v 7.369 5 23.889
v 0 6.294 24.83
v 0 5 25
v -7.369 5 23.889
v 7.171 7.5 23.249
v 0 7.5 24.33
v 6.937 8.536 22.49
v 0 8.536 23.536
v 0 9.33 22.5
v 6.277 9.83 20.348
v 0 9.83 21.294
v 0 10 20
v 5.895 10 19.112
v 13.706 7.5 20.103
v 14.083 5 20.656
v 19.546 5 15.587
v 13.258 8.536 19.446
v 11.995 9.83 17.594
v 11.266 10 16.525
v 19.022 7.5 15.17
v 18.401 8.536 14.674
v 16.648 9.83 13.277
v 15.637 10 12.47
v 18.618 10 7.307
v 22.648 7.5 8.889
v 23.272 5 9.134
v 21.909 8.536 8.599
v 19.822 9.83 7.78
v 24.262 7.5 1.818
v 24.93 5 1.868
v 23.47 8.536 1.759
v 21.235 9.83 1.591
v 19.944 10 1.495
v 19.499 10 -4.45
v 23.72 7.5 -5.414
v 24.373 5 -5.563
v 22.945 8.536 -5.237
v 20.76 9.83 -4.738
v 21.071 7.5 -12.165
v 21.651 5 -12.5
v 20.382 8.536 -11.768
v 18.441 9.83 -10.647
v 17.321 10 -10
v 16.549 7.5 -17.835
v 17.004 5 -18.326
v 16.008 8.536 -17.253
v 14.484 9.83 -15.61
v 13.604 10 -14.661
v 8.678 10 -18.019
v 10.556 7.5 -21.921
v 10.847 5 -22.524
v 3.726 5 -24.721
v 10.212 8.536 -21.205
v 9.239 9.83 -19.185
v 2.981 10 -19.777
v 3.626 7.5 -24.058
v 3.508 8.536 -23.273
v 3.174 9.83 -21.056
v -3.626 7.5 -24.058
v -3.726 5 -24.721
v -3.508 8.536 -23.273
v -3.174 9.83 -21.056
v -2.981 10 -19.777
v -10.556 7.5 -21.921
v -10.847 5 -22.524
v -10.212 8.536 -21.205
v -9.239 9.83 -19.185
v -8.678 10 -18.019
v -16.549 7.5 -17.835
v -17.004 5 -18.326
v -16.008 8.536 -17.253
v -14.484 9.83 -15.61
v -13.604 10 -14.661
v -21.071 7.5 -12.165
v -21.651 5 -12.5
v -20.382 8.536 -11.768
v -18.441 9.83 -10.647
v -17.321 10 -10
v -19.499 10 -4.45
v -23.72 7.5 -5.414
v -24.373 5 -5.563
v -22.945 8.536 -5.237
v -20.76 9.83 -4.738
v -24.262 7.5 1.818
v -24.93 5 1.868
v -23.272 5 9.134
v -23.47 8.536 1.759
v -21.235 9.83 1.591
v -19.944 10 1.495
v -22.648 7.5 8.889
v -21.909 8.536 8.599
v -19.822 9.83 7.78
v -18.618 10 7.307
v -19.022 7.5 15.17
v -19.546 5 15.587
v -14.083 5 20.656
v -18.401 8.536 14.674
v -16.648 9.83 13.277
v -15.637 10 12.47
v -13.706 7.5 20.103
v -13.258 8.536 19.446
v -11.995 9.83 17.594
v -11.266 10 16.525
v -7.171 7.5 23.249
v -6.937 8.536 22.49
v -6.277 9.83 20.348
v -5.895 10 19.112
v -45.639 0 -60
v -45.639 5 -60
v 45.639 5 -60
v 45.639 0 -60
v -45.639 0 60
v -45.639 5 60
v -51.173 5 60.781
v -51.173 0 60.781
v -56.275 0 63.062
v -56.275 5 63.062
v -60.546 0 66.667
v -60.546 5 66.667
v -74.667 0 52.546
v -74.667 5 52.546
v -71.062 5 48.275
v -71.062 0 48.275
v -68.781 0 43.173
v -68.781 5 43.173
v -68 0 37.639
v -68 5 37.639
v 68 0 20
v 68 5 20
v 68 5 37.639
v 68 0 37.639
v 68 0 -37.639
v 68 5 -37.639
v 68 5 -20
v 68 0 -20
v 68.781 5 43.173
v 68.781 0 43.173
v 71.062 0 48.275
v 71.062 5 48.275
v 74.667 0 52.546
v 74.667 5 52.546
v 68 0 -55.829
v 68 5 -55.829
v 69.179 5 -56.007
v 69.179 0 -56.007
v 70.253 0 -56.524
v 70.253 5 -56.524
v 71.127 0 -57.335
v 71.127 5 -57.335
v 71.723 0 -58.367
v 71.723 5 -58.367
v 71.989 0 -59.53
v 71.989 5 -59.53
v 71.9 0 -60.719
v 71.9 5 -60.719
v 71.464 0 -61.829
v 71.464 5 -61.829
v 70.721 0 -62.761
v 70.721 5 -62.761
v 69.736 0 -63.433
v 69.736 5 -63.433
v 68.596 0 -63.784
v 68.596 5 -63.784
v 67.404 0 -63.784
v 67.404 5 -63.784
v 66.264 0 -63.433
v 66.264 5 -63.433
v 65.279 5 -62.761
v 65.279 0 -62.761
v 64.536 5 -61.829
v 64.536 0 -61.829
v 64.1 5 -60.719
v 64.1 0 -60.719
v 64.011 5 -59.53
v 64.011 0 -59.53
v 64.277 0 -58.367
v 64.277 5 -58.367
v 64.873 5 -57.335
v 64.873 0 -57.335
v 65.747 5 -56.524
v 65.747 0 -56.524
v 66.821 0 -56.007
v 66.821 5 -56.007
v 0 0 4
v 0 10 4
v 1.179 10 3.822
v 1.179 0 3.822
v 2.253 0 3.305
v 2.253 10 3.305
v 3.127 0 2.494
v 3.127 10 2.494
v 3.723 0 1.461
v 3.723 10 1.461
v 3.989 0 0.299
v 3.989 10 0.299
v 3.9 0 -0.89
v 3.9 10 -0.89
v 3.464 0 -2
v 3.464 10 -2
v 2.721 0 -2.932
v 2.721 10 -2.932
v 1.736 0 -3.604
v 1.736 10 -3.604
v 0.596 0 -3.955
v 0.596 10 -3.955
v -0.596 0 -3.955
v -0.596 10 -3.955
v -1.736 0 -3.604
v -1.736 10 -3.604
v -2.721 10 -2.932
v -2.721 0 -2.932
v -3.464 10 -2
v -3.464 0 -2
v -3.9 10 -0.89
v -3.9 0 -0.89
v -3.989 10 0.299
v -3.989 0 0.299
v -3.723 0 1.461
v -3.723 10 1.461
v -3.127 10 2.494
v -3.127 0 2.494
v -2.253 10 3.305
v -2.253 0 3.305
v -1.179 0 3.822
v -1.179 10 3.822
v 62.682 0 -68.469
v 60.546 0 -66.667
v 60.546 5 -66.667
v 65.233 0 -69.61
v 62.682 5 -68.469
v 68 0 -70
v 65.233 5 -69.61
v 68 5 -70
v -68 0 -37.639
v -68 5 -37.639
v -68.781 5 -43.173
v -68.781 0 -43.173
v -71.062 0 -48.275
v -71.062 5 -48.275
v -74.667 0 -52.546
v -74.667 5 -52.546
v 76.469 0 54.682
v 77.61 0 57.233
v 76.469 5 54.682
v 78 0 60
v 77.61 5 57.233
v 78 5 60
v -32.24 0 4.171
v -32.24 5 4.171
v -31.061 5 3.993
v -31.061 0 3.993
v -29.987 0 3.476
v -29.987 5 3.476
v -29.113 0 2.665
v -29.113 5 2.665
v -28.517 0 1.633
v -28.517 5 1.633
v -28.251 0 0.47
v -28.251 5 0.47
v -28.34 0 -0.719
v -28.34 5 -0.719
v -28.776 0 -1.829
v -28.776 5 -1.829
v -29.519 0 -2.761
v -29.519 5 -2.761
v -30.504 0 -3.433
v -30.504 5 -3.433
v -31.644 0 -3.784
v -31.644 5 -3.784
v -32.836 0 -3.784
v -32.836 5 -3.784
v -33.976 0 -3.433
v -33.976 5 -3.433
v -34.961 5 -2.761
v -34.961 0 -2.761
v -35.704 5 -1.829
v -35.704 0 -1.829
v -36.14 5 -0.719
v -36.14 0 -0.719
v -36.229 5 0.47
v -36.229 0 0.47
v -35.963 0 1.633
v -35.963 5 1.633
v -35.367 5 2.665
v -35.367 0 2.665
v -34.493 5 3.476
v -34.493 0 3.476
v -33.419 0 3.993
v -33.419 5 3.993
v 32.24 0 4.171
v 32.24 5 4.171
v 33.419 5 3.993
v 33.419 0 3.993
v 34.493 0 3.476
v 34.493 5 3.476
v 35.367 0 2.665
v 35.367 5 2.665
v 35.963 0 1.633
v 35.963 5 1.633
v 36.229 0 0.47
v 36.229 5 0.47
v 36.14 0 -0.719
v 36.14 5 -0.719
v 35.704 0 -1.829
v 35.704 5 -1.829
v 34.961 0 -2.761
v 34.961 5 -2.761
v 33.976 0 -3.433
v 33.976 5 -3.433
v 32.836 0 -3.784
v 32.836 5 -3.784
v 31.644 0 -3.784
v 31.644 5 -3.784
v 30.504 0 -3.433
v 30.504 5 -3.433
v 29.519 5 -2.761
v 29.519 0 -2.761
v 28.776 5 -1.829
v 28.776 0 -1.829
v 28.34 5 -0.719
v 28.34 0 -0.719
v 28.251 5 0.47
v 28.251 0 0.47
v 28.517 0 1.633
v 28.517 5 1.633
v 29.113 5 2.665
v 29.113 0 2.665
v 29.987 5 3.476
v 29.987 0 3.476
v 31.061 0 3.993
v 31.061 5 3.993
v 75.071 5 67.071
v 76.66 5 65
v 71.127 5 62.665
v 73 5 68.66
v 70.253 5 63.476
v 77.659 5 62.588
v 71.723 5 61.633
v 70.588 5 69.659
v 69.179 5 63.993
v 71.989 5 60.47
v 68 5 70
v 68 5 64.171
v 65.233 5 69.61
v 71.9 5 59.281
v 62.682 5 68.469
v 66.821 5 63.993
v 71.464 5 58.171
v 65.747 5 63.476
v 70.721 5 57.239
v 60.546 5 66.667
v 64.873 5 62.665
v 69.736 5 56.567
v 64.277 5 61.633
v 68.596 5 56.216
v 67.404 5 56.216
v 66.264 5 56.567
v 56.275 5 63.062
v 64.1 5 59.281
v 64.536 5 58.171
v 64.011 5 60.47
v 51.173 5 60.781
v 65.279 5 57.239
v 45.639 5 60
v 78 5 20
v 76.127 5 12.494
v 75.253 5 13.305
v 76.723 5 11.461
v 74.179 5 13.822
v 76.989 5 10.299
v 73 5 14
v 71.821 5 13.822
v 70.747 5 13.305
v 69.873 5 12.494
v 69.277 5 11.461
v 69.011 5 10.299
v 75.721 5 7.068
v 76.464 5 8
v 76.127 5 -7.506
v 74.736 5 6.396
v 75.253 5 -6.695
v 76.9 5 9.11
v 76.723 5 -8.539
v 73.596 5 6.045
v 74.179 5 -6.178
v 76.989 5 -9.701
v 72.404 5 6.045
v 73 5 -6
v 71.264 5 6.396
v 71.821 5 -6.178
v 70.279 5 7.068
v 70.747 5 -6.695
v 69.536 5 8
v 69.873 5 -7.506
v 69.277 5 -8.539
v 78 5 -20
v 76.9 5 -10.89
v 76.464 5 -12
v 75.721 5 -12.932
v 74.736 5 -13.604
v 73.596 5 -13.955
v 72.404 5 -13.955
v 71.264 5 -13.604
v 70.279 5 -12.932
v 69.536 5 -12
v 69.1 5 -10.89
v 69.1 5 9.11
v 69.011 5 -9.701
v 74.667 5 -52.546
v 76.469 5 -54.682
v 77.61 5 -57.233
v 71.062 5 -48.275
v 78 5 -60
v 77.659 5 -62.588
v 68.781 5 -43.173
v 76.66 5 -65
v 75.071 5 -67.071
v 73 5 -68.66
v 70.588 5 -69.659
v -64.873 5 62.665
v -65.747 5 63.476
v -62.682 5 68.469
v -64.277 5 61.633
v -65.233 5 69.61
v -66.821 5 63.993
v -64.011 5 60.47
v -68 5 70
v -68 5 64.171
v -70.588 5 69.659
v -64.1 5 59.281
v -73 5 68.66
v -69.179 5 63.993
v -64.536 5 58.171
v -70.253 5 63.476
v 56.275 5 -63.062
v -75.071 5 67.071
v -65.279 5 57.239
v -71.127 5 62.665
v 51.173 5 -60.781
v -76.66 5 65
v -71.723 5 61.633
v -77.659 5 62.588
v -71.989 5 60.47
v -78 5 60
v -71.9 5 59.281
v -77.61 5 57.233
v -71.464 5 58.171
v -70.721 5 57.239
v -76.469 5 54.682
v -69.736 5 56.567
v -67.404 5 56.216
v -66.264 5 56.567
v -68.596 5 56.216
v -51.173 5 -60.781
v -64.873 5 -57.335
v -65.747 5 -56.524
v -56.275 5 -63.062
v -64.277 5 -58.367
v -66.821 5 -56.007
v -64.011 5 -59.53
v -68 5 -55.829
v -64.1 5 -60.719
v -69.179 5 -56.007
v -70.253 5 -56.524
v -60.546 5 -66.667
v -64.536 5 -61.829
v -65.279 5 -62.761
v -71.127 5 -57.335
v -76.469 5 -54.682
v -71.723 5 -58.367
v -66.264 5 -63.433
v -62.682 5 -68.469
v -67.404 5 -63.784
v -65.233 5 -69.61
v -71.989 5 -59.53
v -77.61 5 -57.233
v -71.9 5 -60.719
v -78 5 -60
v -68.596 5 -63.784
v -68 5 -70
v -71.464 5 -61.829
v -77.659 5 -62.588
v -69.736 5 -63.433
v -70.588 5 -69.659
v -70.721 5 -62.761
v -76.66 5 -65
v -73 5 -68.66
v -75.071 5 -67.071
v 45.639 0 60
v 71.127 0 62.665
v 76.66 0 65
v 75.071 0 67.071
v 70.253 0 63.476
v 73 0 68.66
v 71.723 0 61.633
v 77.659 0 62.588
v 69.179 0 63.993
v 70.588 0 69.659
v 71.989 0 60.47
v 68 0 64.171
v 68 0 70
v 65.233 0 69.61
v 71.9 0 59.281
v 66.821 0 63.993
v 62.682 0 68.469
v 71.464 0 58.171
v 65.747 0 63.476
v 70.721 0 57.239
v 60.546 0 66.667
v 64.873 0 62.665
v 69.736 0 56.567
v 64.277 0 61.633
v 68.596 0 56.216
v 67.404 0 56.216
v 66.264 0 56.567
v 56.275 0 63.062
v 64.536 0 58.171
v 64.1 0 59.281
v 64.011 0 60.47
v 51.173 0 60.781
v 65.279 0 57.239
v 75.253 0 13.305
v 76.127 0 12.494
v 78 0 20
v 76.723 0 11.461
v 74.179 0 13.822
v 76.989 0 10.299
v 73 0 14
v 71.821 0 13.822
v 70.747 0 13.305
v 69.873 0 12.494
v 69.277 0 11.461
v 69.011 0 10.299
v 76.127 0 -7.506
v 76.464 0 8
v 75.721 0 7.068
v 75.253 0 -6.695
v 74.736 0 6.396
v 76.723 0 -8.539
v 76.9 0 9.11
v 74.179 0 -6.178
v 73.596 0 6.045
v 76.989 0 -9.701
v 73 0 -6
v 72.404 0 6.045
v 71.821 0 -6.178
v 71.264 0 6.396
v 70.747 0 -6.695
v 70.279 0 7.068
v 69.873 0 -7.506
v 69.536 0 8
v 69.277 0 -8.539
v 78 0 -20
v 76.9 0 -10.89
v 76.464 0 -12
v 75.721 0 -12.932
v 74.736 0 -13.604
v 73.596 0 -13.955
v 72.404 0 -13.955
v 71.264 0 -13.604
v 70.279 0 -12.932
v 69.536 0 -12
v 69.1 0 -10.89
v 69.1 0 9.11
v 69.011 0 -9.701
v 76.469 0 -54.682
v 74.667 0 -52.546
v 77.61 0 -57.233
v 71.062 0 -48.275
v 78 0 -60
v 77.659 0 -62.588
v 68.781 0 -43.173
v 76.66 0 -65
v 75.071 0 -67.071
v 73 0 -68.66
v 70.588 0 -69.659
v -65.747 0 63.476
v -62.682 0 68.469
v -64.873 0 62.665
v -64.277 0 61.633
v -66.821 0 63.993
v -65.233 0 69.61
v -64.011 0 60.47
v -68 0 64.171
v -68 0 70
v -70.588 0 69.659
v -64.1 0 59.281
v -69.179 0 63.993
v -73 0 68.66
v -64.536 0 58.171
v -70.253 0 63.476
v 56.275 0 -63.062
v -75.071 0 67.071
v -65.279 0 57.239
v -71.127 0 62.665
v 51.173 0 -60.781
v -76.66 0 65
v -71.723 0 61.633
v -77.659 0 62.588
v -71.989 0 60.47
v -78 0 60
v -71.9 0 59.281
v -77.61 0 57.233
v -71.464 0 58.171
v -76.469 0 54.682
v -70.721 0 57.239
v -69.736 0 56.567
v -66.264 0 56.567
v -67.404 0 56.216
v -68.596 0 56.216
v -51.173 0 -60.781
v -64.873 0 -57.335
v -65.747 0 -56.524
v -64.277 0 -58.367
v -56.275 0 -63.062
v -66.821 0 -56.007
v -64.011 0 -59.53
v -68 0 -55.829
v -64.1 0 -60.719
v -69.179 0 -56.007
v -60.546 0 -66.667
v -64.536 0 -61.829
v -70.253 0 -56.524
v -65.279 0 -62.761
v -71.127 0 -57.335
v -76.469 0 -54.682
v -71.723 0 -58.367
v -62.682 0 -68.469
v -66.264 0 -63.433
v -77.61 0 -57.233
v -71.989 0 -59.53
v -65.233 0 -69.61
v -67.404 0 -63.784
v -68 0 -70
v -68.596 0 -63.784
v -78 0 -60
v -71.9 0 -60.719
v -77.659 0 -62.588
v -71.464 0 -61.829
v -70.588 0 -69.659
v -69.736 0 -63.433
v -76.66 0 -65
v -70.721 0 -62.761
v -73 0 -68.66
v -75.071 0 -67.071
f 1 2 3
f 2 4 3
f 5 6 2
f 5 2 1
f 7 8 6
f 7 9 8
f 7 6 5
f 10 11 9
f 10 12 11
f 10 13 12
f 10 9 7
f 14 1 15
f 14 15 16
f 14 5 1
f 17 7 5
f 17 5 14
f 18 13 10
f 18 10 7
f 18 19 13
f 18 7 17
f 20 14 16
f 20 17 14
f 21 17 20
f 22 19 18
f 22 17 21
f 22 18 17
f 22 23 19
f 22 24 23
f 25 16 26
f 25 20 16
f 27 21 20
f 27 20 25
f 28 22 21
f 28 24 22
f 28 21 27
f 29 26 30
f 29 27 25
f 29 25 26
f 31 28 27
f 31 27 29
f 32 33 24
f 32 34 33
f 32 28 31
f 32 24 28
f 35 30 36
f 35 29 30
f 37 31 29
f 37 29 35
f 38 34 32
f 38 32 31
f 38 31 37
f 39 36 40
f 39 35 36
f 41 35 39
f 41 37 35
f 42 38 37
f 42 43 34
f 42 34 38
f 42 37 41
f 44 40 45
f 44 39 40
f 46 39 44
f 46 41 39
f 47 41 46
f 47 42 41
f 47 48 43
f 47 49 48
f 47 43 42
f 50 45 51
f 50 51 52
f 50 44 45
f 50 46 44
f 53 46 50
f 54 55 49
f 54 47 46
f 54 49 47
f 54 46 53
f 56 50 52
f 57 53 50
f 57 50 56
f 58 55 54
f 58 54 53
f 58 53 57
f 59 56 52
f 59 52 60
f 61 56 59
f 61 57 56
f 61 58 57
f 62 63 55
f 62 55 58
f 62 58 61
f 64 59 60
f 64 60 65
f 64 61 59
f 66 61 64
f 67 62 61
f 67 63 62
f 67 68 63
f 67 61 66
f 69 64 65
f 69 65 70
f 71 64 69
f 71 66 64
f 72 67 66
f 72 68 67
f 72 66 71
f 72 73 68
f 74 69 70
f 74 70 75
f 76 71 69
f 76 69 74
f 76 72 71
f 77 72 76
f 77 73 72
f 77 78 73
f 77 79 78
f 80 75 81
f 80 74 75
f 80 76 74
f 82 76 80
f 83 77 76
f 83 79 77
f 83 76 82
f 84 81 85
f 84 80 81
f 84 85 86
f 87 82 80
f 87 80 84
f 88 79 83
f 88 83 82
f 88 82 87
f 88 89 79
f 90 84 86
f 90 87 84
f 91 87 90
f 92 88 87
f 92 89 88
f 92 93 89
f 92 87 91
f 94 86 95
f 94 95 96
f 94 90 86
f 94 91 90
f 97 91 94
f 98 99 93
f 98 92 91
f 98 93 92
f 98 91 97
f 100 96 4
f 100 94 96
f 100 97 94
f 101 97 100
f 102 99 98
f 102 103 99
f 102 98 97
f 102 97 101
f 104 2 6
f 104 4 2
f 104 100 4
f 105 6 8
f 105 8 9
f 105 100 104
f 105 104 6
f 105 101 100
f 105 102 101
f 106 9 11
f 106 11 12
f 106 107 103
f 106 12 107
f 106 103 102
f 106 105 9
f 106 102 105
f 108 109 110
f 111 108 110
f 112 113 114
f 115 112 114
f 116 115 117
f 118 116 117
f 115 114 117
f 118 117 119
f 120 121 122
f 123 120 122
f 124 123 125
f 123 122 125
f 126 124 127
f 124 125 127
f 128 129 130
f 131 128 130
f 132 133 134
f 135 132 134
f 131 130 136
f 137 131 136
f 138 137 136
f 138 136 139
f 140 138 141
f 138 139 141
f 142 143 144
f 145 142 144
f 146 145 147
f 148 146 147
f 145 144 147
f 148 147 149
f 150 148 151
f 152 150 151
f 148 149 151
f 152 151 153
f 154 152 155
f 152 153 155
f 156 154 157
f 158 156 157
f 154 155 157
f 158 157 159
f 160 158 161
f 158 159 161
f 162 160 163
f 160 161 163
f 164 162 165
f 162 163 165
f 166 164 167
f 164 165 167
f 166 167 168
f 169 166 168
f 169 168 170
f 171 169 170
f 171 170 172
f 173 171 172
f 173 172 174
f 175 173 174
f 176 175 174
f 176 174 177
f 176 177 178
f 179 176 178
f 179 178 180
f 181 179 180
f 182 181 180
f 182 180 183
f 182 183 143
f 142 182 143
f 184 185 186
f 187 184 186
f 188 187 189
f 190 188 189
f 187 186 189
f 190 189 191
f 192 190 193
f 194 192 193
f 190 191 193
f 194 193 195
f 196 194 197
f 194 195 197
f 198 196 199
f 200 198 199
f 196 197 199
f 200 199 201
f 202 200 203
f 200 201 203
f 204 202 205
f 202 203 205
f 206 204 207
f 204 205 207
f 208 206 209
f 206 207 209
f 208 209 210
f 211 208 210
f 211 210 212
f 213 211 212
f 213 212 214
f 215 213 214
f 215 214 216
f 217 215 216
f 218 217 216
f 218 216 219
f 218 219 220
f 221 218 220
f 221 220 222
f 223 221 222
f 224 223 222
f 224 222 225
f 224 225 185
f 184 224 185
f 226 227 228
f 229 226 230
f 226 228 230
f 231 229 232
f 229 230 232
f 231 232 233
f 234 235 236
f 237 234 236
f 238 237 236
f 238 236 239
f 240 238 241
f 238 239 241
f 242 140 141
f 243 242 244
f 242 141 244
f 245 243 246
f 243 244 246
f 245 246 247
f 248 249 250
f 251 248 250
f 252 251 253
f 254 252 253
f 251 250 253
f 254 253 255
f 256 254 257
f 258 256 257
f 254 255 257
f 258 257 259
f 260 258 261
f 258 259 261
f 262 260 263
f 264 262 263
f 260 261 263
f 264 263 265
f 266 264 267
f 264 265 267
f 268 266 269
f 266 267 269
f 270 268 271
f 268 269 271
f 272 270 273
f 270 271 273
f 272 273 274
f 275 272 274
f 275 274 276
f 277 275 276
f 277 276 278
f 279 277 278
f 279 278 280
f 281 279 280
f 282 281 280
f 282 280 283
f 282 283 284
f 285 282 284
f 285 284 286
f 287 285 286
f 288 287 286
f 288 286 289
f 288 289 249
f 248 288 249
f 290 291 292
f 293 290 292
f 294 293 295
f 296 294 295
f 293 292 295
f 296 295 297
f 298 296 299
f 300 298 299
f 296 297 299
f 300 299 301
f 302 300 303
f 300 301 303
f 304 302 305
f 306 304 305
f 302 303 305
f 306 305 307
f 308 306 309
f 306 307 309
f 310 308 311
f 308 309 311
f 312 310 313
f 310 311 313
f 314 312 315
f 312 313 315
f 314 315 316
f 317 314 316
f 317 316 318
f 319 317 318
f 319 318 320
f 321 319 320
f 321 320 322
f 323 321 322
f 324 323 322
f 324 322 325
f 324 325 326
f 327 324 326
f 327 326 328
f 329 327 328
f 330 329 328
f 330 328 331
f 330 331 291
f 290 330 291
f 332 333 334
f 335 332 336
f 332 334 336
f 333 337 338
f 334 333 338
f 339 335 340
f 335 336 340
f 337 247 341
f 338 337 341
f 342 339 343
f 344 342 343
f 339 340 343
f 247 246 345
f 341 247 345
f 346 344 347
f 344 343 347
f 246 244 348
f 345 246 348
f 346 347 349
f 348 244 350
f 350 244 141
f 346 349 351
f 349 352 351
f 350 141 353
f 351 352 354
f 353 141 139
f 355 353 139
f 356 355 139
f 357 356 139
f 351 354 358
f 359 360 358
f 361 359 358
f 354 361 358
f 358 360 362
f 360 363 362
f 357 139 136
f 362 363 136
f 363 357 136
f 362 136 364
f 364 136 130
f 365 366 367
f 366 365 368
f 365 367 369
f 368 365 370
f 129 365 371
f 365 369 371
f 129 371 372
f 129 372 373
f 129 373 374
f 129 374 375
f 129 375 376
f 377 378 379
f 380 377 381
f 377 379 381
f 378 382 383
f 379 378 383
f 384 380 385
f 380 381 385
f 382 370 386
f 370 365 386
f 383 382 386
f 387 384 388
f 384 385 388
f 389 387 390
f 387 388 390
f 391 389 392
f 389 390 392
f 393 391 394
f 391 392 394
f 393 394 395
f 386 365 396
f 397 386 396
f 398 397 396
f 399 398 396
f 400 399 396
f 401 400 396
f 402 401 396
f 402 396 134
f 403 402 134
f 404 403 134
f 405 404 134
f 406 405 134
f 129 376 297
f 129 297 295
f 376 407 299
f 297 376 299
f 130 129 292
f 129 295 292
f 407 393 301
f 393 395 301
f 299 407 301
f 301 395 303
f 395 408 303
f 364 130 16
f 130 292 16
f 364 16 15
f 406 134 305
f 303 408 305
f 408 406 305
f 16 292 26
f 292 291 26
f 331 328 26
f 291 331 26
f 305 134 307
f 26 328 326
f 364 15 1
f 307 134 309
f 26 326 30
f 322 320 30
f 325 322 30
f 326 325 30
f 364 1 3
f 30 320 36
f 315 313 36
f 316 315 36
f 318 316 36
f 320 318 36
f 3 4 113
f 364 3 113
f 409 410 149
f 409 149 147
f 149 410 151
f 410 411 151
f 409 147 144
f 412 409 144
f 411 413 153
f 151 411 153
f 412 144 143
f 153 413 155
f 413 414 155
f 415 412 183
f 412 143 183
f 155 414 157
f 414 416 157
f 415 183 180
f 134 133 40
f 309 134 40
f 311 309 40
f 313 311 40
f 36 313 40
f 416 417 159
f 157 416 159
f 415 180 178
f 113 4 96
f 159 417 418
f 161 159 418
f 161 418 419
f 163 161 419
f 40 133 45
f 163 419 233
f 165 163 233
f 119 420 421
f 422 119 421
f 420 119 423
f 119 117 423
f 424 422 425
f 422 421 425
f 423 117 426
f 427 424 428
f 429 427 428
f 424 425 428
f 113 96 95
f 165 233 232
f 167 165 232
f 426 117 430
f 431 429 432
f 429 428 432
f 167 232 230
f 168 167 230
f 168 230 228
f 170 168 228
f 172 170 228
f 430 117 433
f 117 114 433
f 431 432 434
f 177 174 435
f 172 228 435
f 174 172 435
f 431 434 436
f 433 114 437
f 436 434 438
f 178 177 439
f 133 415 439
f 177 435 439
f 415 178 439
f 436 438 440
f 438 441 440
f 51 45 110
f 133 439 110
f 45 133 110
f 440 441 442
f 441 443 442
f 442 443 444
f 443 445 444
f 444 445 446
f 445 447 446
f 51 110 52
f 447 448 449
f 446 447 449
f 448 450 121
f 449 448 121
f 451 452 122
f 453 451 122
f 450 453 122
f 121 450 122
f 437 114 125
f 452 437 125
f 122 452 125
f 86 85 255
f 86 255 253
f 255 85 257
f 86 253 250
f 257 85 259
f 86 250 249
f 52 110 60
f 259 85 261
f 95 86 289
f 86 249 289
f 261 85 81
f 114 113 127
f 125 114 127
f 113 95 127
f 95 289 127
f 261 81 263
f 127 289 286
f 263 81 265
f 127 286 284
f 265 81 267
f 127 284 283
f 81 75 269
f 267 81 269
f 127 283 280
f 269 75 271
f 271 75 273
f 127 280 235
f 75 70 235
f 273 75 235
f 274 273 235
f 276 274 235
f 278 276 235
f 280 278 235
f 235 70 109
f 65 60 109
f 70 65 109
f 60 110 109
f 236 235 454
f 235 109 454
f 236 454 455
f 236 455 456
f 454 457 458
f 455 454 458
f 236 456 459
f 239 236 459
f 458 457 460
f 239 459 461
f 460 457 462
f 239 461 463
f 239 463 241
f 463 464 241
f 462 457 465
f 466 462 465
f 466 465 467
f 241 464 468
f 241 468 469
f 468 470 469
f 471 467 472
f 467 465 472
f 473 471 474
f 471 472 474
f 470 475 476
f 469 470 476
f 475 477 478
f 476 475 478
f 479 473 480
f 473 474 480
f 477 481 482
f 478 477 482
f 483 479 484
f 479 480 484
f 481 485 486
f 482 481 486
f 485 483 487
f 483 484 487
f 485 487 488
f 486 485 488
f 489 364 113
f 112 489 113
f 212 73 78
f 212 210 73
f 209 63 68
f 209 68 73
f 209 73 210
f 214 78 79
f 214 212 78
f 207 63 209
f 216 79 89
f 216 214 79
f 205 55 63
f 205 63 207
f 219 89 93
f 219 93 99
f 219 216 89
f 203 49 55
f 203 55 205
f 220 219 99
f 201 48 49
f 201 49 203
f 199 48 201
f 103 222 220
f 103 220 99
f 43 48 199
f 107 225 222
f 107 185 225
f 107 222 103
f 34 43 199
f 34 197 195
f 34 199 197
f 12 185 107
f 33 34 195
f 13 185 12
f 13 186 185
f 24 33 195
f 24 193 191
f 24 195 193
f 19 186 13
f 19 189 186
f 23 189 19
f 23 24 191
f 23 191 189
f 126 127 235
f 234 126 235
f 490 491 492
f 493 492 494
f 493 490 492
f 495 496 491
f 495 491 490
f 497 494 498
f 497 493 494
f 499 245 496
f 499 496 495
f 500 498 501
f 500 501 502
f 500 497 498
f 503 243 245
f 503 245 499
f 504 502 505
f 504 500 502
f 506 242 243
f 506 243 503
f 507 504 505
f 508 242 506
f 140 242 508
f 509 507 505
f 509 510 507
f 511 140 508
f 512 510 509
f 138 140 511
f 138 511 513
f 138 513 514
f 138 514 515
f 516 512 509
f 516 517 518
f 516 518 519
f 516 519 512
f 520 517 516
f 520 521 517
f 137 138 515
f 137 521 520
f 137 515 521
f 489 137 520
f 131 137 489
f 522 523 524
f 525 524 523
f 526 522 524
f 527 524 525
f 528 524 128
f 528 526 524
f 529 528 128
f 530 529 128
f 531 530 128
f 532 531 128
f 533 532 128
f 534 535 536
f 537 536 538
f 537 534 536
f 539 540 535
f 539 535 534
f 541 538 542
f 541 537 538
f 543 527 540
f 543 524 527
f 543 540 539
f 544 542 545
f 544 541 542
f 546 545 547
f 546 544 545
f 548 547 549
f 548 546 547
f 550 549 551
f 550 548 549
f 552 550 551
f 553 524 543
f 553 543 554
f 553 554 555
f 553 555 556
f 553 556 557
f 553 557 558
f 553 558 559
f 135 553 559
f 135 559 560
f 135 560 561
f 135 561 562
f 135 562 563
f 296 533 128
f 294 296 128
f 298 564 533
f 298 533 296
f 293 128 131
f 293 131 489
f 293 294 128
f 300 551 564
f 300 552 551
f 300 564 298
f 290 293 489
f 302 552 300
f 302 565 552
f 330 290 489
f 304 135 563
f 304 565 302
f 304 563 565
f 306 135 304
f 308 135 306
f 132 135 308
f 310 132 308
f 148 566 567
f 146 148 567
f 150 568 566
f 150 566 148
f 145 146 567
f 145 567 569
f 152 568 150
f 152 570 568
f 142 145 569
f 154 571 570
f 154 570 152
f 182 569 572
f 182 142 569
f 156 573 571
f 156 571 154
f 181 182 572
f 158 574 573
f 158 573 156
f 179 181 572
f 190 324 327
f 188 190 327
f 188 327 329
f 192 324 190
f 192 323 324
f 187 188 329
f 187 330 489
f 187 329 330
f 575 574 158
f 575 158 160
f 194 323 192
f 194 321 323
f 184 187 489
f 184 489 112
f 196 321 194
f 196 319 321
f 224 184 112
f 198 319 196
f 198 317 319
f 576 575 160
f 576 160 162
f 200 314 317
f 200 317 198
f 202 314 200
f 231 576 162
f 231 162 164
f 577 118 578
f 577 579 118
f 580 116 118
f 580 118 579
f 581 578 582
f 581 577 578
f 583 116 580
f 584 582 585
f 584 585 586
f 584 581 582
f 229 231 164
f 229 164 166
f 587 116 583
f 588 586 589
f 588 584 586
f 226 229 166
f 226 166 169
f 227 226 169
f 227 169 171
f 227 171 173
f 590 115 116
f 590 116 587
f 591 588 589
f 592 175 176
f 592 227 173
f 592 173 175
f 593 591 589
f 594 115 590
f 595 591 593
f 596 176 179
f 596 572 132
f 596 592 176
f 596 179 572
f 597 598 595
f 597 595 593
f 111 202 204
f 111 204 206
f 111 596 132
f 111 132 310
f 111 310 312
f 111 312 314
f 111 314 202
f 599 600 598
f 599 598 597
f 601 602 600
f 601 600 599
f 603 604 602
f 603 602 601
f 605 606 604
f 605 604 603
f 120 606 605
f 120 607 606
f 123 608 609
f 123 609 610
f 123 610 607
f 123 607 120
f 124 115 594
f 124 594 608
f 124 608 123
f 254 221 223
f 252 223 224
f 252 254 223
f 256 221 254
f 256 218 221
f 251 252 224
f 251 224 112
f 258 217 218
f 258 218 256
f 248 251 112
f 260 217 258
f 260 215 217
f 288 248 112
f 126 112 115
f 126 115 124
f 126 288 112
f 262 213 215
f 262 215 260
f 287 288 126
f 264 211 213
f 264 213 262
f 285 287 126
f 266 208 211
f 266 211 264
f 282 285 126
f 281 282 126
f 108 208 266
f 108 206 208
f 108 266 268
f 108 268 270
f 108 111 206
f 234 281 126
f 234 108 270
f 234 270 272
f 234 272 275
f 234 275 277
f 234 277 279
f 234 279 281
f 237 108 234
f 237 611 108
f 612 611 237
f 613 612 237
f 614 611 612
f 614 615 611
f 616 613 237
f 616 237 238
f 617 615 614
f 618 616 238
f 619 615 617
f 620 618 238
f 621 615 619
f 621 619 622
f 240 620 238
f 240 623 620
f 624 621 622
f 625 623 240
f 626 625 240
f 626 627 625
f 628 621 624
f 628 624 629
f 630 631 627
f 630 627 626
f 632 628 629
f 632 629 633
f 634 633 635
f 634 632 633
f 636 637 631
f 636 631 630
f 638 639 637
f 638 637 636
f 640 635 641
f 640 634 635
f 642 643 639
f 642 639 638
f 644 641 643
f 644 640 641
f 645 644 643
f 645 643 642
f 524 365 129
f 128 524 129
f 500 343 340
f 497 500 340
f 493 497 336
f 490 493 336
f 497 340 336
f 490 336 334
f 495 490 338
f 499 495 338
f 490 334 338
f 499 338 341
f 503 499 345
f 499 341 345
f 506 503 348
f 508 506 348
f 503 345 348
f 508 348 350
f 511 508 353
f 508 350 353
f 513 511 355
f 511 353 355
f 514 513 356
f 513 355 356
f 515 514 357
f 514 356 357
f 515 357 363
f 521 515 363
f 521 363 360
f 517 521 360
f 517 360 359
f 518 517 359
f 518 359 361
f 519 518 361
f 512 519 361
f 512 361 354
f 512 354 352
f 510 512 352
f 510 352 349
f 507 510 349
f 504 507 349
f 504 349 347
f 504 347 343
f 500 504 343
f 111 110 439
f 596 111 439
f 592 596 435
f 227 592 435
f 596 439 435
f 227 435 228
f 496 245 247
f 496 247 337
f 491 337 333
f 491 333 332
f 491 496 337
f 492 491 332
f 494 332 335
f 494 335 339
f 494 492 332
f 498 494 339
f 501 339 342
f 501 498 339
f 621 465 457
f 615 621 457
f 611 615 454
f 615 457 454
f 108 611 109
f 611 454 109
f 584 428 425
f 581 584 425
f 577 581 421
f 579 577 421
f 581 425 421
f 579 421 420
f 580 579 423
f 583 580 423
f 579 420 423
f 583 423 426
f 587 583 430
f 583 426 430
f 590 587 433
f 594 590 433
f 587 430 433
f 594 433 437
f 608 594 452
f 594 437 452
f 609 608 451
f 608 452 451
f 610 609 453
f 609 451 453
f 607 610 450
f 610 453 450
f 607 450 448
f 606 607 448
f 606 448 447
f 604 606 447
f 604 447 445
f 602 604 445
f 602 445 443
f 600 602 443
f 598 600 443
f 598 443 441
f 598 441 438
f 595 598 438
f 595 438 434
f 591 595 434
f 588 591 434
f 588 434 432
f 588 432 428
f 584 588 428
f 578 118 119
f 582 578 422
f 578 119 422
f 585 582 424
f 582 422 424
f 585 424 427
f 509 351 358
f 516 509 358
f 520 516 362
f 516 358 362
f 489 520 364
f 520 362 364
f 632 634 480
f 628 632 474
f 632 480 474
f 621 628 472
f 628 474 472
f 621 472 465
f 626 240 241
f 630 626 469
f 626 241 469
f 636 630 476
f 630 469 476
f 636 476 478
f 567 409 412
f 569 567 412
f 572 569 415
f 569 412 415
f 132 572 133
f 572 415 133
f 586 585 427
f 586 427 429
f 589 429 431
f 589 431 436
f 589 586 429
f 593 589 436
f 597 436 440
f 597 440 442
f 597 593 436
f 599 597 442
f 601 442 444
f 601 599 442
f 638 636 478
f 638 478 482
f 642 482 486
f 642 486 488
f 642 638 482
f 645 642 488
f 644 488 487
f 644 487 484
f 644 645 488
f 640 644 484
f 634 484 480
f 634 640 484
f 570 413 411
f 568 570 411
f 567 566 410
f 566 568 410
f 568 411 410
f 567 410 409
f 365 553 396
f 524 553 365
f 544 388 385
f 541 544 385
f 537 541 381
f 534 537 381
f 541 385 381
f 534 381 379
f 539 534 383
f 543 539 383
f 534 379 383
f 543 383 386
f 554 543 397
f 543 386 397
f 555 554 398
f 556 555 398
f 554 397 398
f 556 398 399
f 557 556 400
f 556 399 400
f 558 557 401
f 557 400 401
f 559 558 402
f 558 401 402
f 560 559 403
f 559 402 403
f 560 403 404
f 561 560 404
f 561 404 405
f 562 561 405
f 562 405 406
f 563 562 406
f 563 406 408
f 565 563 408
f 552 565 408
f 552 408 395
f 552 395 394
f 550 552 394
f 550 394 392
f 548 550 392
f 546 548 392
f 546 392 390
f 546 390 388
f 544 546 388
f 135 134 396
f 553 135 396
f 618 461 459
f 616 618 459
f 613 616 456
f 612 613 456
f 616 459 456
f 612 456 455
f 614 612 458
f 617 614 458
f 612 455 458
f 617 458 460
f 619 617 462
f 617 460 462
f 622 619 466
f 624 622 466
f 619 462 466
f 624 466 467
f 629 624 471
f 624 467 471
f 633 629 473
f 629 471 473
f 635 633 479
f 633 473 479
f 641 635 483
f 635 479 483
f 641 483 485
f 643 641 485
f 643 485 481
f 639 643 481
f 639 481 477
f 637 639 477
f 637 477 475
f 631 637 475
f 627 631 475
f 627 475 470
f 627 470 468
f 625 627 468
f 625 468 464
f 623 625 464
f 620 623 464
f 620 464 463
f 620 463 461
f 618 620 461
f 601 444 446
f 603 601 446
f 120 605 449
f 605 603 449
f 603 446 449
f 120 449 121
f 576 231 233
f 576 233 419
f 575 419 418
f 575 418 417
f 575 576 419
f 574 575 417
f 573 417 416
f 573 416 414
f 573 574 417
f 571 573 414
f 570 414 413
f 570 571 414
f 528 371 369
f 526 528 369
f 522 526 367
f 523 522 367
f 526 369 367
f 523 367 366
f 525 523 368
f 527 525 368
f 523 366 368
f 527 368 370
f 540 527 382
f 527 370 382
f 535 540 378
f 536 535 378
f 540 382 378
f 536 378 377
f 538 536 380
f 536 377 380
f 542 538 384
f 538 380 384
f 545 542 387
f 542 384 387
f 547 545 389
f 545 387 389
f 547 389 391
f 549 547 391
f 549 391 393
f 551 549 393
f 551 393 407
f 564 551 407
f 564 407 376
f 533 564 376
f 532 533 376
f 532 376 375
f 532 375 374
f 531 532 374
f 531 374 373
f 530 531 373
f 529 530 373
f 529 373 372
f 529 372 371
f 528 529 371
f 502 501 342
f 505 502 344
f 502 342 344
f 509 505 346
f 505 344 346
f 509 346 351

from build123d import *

# Parameters (mm, degrees)
SALIENTE_EXTRUIR1_DEPTH = 5
CROQUIS3_R              = 25
SALIENTE_EXTRUIR2_DEPTH = 5
CORTAR_EXTRUIR1_REACH   = 107.281
CROQUIS4_R              = 4
CORTAR_EXTRUIR2_REACH   = 106.924
CROQUIS5_R              = 4
CORTAR_EXTRUIR8_REACH   = 106.924
CROQUIS12_R             = 4
REDONDEO2_R             = 5


with BuildPart() as part:
    # Croquis1 → Saliente-Extruir1 (new body)
    with BuildSketch(Plane(origin=(0, 0, 0), x_dir=(1, 0, 0), z_dir=(0, 1, 0))):
        with BuildLine():
            Line((78, 60), (78, -60))
            ThreePointArc((78, -60), (75.071067812, -67.071067812), (68, -70))
            Line((68, -70), (-68, -70))
            ThreePointArc((-68, -70), (-75.071067812, -67.071067812), (-78, -60))
            Line((-78, -60), (-78, 60))
            ThreePointArc((-78, 60), (-75.071067812, 67.071067812), (-68, 70))
            Line((-68, 70), (68, 70))
            ThreePointArc((68, 70), (75.071067812, 67.071067812), (78, 60))
        make_face()
    extrude(amount=SALIENTE_EXTRUIR1_DEPTH)

    # Croquis3 → Saliente-Extruir2 (add)
    with BuildSketch(Plane(origin=(0, 5, 0), x_dir=(1, 0, 0), z_dir=(0, 1, 0))):
        with Locations(Location((0, 0, 0), (0, 0, 270))):
            Circle(CROQUIS3_R)
    extrude(amount=SALIENTE_EXTRUIR2_DEPTH)

    # Croquis4 → Cortar-Extruir1 (cut, up to next)
    with BuildSketch(Plane(origin=(0, 10, 0), x_dir=(1, 0, 0), z_dir=(0, 1, 0)), mode=Mode.PRIVATE) as cortar_extruir1_sk1:
        with Locations(Location((0, 0, 0), (0, 0, 270))):
            Circle(CROQUIS4_R)
    cortar_extruir1_tool1 = extrude(cortar_extruir1_sk1.sketch, amount=-CORTAR_EXTRUIR1_REACH, mode=Mode.PRIVATE) & part.part
    add(cortar_extruir1_tool1.solids().sort_by_distance((0, 10, 0))[0], mode=Mode.SUBTRACT)

    # Croquis5 → Cortar-Extruir2 (cut, up to next)
    with BuildSketch(Plane(origin=(0, 5, 0), x_dir=(1, 0, 0), z_dir=(0, 1, 0)), mode=Mode.PRIVATE) as cortar_extruir2_sk1:
        with Locations(Location((-68, -60.171139927, 0), (0, 0, 270))):
            Circle(CROQUIS5_R)
    cortar_extruir2_tool1 = extrude(cortar_extruir2_sk1.sketch, amount=-CORTAR_EXTRUIR2_REACH, mode=Mode.PRIVATE) & part.part
    # Croquis5 → Cortar-Extruir2 (cut, up to next)
    with BuildSketch(Plane(origin=(0, 5, 0), x_dir=(1, 0, 0), z_dir=(0, 1, 0)), mode=Mode.PRIVATE) as cortar_extruir2_sk2:
        with Locations(Location((-68, 59.828860073, 0), (0, 0, 270))):
            Circle(CROQUIS5_R)
    cortar_extruir2_tool2 = extrude(cortar_extruir2_sk2.sketch, amount=-CORTAR_EXTRUIR2_REACH, mode=Mode.PRIVATE) & part.part
    # Croquis5 → Cortar-Extruir2 (cut, up to next)
    with BuildSketch(Plane(origin=(0, 5, 0), x_dir=(1, 0, 0), z_dir=(0, 1, 0)), mode=Mode.PRIVATE) as cortar_extruir2_sk3:
        with Locations(Location((68, -60.171139927, 0), (0, 0, 270))):
            Circle(CROQUIS5_R)
    cortar_extruir2_tool3 = extrude(cortar_extruir2_sk3.sketch, amount=-CORTAR_EXTRUIR2_REACH, mode=Mode.PRIVATE) & part.part
    # Croquis5 → Cortar-Extruir2 (cut, up to next)
    with BuildSketch(Plane(origin=(0, 5, 0), x_dir=(1, 0, 0), z_dir=(0, 1, 0)), mode=Mode.PRIVATE) as cortar_extruir2_sk4:
        with Locations(Location((68, 59.828860073, 0), (0, 0, 270))):
            Circle(CROQUIS5_R)
    cortar_extruir2_tool4 = extrude(cortar_extruir2_sk4.sketch, amount=-CORTAR_EXTRUIR2_REACH, mode=Mode.PRIVATE) & part.part
    # Croquis5 → Cortar-Extruir2 (cut, up to next)
    with BuildSketch(Plane(origin=(0, 5, 0), x_dir=(1, 0, 0), z_dir=(0, 1, 0)), mode=Mode.PRIVATE) as cortar_extruir2_sk5:
        with Locations(Location((32.24, -0.171139927, 0), (0, 0, 270))):
            Circle(CROQUIS5_R)
    cortar_extruir2_tool5 = extrude(cortar_extruir2_sk5.sketch, amount=-CORTAR_EXTRUIR2_REACH, mode=Mode.PRIVATE) & part.part
    # Croquis5 → Cortar-Extruir2 (cut, up to next)
    with BuildSketch(Plane(origin=(0, 5, 0), x_dir=(1, 0, 0), z_dir=(0, 1, 0)), mode=Mode.PRIVATE) as cortar_extruir2_sk6:
        with Locations(Location((-32.24, -0.171139927, 0), (0, 0, 270))):
            Circle(CROQUIS5_R)
    cortar_extruir2_tool6 = extrude(cortar_extruir2_sk6.sketch, amount=-CORTAR_EXTRUIR2_REACH, mode=Mode.PRIVATE) & part.part
    add(cortar_extruir2_tool1.solids().sort_by_distance((-68, 5, 60.17114))[0], mode=Mode.SUBTRACT)
    add(cortar_extruir2_tool2.solids().sort_by_distance((-68, 5, -59.82886))[0], mode=Mode.SUBTRACT)
    add(cortar_extruir2_tool3.solids().sort_by_distance((68, 5, 60.17114))[0], mode=Mode.SUBTRACT)
    add(cortar_extruir2_tool4.solids().sort_by_distance((68, 5, -59.82886))[0], mode=Mode.SUBTRACT)
    add(cortar_extruir2_tool5.solids().sort_by_distance((32.24, 5, 0.17114))[0], mode=Mode.SUBTRACT)
    add(cortar_extruir2_tool6.solids().sort_by_distance((-32.24, 5, 0.17114))[0], mode=Mode.SUBTRACT)

    # Croquis12 → Cortar-Extruir8 (cut, up to next)
    with BuildSketch(Plane(origin=(0, 5, 0), x_dir=(1, 0, 0), z_dir=(0, 1, 0)), mode=Mode.PRIVATE) as cortar_extruir8_sk1:
        with BuildLine():
            Line((68, 70), (-68, 70))
            ThreePointArc((-68, 70), (-63.917517095, 69.128709292), (-60.546440075, 66.666666667))
            ThreePointArc((-60.546440075, 66.666666667), (-53.804286034, 61.742581416), (-45.639320225, 60))
            Line((-45.639320225, 60), (45.639320225, 60))
            ThreePointArc((45.639320225, 60), (53.804286034, 61.742581416), (60.546440075, 66.666666667))
            ThreePointArc((60.546440075, 66.666666667), (63.917517095, 69.128709292), (68, 70))
        make_face()
    cortar_extruir8_tool1 = extrude(cortar_extruir8_sk1.sketch, amount=-CORTAR_EXTRUIR8_REACH, mode=Mode.PRIVATE) & part.part
    # Croquis12 → Cortar-Extruir8 (cut, up to next)
    with BuildSketch(Plane(origin=(0, 5, 0), x_dir=(1, 0, 0), z_dir=(0, 1, 0)), mode=Mode.PRIVATE) as cortar_extruir8_sk2:
        with BuildLine():
            Line((-78, 60), (-78, -60))
            ThreePointArc((-78, -60), (-77.128709292, -55.917517095), (-74.666666667, -52.546440075))
            ThreePointArc((-74.666666667, -52.546440075), (-69.742581416, -45.804286034), (-68, -37.639320225))
            Line((-68, -37.639320225), (-68, 37.639320225))
            ThreePointArc((-68, 37.639320225), (-69.742581416, 45.804286034), (-74.666666667, 52.546440075))
            ThreePointArc((-74.666666667, 52.546440075), (-77.128709292, 55.917517095), (-78, 60))
        make_face()
    cortar_extruir8_tool2 = extrude(cortar_extruir8_sk2.sketch, amount=-CORTAR_EXTRUIR8_REACH, mode=Mode.PRIVATE) & part.part
    # Croquis12 → Cortar-Extruir8 (cut, up to next)
    with BuildSketch(Plane(origin=(0, 5, 0), x_dir=(1, 0, 0), z_dir=(0, 1, 0)), mode=Mode.PRIVATE) as cortar_extruir8_sk3:
        with BuildLine():
            Line((-68, -70), (68, -70))
            ThreePointArc((68, -70), (63.917517095, -69.128709292), (60.546440075, -66.666666667))
            ThreePointArc((60.546440075, -66.666666667), (53.804286034, -61.742581416), (45.639320225, -60))
            Line((45.639320225, -60), (-45.639320225, -60))
            ThreePointArc((-45.639320225, -60), (-53.804286034, -61.742581416), (-60.546440075, -66.666666667))
            ThreePointArc((-60.546440075, -66.666666667), (-63.917517095, -69.128709292), (-68, -70))
        make_face()
    cortar_extruir8_tool3 = extrude(cortar_extruir8_sk3.sketch, amount=-CORTAR_EXTRUIR8_REACH, mode=Mode.PRIVATE) & part.part
    # Croquis12 → Cortar-Extruir8 (cut, up to next)
    with BuildSketch(Plane(origin=(0, 5, 0), x_dir=(1, 0, 0), z_dir=(0, 1, 0)), mode=Mode.PRIVATE) as cortar_extruir8_sk4:
        with BuildLine():
            ThreePointArc((74.666666667, -52.546440075), (77.128709292, -55.917517095), (78, -60))
            Line((78, -60), (78, -20))
            Line((78, -20), (68, -20))
            Line((68, -20), (68, -37.639320225))
            ThreePointArc((68, -37.639320225), (69.742581416, -45.804286034), (74.666666667, -52.546440075))
        make_face()
    cortar_extruir8_tool4 = extrude(cortar_extruir8_sk4.sketch, amount=-CORTAR_EXTRUIR8_REACH, mode=Mode.PRIVATE) & part.part
    # Croquis12 → Cortar-Extruir8 (cut, up to next)
    with BuildSketch(Plane(origin=(0, 5, 0), x_dir=(1, 0, 0), z_dir=(0, 1, 0)), mode=Mode.PRIVATE) as cortar_extruir8_sk5:
        with BuildLine():
            Line((68, 20), (78, 20))
            Line((78, 20), (78, 60))
            ThreePointArc((78, 60), (77.128709292, 55.917517095), (74.666666667, 52.546440075))
            ThreePointArc((74.666666667, 52.546440075), (69.742581416, 45.804286034), (68, 37.639320225))
            Line((68, 37.639320225), (68, 20))
        make_face()
    cortar_extruir8_tool5 = extrude(cortar_extruir8_sk5.sketch, amount=-CORTAR_EXTRUIR8_REACH, mode=Mode.PRIVATE) & part.part
    # Croquis12 → Cortar-Extruir8 (cut, up to next)
    with BuildSketch(Plane(origin=(0, 5, 0), x_dir=(1, 0, 0), z_dir=(0, 1, 0)), mode=Mode.PRIVATE) as cortar_extruir8_sk6:
        with Locations(Location((73, 10, 0), (0, 0, 270))):
            Circle(CROQUIS12_R)
    cortar_extruir8_tool6 = extrude(cortar_extruir8_sk6.sketch, amount=-CORTAR_EXTRUIR8_REACH, mode=Mode.PRIVATE) & part.part
    # Croquis12 → Cortar-Extruir8 (cut, up to next)
    with BuildSketch(Plane(origin=(0, 5, 0), x_dir=(1, 0, 0), z_dir=(0, 1, 0)), mode=Mode.PRIVATE) as cortar_extruir8_sk7:
        with Locations(Location((73, -10, 0), (0, 0, 270))):
            Circle(CROQUIS12_R)
    cortar_extruir8_tool7 = extrude(cortar_extruir8_sk7.sketch, amount=-CORTAR_EXTRUIR8_REACH, mode=Mode.PRIVATE) & part.part
    add(cortar_extruir8_tool1.solids().sort_by_distance((0, 5, -65.214104))[0], mode=Mode.SUBTRACT)
    add(cortar_extruir8_tool2.solids().sort_by_distance((-73.248187, 5, 0))[0], mode=Mode.SUBTRACT)
    add(cortar_extruir8_tool3.solids().sort_by_distance((0, 5, 65.214104))[0], mode=Mode.SUBTRACT)
    add(cortar_extruir8_tool4.solids().sort_by_distance((73.412248, 5, 35.448838))[0], mode=Mode.SUBTRACT)
    add(cortar_extruir8_tool5.solids().sort_by_distance((73.412248, 5, -35.448838))[0], mode=Mode.SUBTRACT)
    add(cortar_extruir8_tool6.solids().sort_by_distance((73, 5, -10))[0], mode=Mode.SUBTRACT)
    add(cortar_extruir8_tool7.solids().sort_by_distance((73, 5, 10))[0], mode=Mode.SUBTRACT)

    # Redondeo2
    redondeo2_edges = [part.edges().sort_by_distance(p)[0] for p in [
        (0, 10, -25),
    ]]
    fillet(redondeo2_edges, radius=REDONDEO2_R - 0.0001)  # a hair under: the kernel refuses the full size


solid = part.part
